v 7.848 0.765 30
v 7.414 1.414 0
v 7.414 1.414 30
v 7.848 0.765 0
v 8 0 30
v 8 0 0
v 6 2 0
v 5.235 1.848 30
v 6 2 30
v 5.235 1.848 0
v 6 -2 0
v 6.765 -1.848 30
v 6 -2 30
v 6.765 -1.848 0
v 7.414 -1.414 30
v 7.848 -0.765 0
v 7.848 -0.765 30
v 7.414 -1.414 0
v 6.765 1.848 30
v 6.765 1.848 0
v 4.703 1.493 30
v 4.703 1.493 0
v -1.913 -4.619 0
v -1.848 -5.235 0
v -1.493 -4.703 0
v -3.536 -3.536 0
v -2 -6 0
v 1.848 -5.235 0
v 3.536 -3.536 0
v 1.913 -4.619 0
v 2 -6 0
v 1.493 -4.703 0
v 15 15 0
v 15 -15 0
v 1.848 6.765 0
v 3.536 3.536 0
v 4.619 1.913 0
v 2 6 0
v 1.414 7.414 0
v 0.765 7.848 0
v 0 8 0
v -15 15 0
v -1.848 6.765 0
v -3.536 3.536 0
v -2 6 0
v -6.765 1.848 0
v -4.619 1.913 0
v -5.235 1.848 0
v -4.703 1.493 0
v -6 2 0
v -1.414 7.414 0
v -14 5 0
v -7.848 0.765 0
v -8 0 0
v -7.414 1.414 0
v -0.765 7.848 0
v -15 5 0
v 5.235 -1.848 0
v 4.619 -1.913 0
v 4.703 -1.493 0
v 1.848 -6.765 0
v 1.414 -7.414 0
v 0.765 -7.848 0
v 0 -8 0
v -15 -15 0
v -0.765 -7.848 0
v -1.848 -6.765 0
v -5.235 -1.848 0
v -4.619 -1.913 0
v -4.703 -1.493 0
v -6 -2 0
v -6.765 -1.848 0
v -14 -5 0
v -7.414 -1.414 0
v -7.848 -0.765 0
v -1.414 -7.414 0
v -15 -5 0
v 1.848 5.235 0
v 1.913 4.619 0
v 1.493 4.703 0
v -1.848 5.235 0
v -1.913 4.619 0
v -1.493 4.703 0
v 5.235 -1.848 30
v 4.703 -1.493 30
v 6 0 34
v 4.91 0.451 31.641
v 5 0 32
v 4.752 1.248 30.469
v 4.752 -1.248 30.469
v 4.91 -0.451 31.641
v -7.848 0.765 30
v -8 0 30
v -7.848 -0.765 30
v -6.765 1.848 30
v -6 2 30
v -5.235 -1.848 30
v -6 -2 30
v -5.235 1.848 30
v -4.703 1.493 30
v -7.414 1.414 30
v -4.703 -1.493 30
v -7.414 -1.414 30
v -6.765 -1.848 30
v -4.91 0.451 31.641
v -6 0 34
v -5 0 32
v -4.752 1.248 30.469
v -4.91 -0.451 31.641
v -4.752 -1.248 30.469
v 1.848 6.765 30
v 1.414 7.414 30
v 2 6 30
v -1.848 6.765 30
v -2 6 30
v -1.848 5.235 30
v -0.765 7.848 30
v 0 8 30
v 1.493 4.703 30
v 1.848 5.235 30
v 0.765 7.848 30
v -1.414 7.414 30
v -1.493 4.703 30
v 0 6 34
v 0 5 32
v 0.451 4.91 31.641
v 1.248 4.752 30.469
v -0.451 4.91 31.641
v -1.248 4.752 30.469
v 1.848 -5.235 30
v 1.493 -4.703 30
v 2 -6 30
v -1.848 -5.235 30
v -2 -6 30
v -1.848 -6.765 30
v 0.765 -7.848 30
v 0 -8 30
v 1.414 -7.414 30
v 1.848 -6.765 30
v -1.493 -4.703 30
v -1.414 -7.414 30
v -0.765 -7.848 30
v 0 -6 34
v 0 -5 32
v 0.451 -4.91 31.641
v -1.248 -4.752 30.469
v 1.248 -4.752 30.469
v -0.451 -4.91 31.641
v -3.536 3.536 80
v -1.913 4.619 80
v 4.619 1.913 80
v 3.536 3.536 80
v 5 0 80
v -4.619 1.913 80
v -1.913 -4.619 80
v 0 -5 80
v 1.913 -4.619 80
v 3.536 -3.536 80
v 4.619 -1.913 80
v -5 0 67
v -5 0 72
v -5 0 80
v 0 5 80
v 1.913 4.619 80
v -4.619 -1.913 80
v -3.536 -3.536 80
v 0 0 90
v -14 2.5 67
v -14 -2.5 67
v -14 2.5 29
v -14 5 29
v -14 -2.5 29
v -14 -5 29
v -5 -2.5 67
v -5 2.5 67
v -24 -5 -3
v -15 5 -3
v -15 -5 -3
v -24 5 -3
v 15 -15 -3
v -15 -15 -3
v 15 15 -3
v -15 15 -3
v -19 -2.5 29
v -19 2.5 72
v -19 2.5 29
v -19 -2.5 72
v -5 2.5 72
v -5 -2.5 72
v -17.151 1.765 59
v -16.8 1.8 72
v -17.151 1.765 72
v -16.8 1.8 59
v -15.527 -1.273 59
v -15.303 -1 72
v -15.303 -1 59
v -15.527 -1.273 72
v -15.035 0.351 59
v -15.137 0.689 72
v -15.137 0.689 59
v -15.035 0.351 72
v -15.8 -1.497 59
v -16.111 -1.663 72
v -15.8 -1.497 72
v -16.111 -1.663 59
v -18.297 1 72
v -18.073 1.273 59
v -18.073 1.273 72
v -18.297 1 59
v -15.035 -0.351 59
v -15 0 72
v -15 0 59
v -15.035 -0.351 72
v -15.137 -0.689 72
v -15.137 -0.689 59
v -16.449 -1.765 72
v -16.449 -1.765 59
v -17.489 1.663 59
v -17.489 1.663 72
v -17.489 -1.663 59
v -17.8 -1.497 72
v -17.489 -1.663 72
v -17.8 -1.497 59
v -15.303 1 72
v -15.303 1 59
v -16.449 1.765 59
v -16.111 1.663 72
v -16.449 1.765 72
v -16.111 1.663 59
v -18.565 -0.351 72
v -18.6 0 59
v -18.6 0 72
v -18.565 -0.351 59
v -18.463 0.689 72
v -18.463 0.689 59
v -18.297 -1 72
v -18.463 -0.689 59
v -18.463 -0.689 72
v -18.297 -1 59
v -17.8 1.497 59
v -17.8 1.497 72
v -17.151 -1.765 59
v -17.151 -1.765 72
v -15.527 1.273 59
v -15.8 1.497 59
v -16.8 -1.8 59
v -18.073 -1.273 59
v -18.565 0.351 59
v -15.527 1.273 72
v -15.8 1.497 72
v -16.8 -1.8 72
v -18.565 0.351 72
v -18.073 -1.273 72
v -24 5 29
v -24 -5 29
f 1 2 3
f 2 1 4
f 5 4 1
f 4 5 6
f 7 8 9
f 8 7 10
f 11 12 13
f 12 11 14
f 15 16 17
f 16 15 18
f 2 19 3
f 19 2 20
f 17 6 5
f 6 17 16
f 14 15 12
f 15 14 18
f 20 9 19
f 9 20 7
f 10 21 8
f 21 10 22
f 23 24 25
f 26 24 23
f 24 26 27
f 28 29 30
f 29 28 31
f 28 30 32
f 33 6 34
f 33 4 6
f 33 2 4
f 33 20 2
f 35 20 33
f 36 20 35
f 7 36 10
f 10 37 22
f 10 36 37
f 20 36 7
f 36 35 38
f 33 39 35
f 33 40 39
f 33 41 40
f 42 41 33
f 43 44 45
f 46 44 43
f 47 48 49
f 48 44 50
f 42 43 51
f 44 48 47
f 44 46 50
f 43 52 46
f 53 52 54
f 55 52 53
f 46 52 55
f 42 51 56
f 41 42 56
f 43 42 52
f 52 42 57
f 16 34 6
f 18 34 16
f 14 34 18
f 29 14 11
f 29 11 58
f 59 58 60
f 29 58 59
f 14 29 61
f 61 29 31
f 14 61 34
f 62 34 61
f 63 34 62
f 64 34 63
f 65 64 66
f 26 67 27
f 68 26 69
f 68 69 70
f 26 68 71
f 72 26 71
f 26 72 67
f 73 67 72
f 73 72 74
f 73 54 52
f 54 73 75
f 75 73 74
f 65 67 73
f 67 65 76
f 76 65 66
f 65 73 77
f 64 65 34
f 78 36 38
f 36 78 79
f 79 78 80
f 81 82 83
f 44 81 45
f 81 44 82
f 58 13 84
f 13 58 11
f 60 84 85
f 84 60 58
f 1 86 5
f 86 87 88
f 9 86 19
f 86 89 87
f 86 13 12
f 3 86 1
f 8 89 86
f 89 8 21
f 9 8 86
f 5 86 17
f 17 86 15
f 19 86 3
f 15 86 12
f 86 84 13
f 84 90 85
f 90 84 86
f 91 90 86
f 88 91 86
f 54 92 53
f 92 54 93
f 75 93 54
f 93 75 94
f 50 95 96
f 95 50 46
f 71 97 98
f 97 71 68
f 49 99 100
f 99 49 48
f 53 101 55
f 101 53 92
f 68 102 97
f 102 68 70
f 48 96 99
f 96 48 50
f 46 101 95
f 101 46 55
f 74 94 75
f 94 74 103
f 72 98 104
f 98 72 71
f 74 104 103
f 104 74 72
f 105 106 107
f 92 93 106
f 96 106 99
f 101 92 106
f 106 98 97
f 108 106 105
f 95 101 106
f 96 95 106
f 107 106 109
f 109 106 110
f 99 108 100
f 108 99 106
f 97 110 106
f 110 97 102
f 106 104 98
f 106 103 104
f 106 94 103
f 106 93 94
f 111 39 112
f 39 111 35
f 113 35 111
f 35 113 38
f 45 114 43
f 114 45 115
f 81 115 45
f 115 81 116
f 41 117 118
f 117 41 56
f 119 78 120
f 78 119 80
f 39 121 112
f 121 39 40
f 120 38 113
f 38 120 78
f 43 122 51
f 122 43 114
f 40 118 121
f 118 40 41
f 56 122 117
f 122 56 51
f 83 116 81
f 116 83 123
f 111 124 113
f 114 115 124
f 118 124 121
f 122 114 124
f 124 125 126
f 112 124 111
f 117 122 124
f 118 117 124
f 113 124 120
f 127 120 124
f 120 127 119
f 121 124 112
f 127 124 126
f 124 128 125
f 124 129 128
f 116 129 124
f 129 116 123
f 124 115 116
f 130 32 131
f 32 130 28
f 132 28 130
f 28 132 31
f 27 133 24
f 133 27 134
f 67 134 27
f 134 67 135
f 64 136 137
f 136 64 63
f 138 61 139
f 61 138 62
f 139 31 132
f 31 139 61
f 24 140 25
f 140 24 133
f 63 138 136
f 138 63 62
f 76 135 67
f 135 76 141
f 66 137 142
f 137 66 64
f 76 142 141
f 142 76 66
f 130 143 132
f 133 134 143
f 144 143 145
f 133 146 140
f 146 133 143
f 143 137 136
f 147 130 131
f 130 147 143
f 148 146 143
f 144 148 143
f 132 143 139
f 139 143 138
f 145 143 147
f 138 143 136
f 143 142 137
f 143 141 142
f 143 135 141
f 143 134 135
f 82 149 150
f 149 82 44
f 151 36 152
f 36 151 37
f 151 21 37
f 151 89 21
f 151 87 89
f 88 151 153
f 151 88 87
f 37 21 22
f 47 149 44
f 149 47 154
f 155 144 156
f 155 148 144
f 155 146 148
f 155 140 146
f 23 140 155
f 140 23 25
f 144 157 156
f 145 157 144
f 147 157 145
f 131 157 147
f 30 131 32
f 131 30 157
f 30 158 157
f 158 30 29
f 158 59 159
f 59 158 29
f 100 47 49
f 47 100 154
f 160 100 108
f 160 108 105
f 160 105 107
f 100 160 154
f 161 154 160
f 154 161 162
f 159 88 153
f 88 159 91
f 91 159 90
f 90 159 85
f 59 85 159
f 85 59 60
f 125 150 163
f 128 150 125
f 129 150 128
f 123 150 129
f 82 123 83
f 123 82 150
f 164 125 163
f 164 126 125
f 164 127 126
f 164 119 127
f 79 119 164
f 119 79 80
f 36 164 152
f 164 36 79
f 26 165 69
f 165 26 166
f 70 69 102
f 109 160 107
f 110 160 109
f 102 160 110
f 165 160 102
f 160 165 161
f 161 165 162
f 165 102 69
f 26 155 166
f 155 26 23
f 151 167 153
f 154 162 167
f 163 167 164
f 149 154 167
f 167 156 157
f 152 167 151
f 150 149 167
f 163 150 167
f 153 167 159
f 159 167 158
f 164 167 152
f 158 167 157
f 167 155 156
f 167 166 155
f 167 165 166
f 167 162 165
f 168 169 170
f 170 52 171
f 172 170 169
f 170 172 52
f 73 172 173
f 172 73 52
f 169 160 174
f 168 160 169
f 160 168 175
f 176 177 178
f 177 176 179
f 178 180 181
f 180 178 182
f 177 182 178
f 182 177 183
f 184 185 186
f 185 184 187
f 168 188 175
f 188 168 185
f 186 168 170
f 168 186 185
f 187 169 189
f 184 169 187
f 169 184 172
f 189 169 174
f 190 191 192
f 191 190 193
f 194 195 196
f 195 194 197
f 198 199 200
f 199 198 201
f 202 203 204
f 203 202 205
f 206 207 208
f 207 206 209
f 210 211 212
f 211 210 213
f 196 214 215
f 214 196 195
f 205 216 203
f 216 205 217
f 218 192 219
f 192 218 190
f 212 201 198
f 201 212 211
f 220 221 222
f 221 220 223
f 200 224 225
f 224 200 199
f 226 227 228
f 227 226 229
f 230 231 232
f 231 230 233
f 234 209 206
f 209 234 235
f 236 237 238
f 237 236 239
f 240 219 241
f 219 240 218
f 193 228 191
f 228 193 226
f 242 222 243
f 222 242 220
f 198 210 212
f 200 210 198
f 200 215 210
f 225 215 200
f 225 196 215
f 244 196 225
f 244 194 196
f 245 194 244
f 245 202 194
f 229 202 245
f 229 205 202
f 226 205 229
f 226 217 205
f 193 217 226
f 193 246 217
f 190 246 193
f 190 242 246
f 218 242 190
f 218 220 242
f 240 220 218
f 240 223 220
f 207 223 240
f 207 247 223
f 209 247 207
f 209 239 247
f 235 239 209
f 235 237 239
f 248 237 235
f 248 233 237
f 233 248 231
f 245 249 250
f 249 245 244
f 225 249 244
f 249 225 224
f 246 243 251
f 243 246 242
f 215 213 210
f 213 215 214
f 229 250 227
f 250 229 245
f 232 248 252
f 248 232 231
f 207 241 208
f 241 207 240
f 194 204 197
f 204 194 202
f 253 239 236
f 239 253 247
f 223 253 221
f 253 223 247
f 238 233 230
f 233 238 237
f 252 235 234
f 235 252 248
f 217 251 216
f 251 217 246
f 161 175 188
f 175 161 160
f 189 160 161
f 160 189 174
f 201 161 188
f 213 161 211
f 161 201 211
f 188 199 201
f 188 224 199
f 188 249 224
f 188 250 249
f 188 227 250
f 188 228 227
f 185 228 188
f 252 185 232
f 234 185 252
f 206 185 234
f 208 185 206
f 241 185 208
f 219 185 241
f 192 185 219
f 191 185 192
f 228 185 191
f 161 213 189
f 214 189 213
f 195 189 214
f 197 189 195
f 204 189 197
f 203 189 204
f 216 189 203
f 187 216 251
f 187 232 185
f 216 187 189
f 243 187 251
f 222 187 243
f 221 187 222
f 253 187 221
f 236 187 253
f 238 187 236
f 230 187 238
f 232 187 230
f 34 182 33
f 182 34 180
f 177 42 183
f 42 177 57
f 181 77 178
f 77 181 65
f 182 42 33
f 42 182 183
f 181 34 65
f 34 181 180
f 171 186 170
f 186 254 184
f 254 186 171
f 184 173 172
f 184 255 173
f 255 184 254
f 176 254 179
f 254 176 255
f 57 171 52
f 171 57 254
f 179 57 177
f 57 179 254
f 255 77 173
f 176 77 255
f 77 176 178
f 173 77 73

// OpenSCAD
height = 80;
sub_s = 0.4;


union(){ 
	cylinder(r=5,h=height);

	translate([0,0,height])
	cylinder(r1=5,r2=0,h=10);

	translate([6,0,0])
	scale(sub_s)
	{
		cylinder(r=5,h=height-5);

		translate([0,0,height-5])
		cylinder(r1=5,r2=0,h=10);
	}

	translate([-6,0,0])
	scale(sub_s)
	{
		cylinder(r=5,h=height-5);

		translate([0,0,height-5])
		cylinder(r1=5,r2=0,h=10);
	}

	translate([0,6,0])
	scale(sub_s)
	{
		cylinder(r=5,h=height-5);

		translate([0,0,height-5])
		cylinder(r1=5,r2=0,h=10);
	}

	translate([0,-6,0])
	scale(sub_s)
	{
		cylinder(r=5,h=height-5);

		translate([0,0,height-5])
		cylinder(r1=5,r2=0,h=10);
	}
}



translate( [ -30/2,-30/2,-3 ] )
cube( [30,30,3] );

translate( [ -10-30/2+1,-10+10/2,-3 ] )
cube( [10,10,height*sub_s] );

translate( [ -5-30/2+1,-5+5/2,-3 ] )
difference() {
	cube( [5,5,height-10] );
	translate( [ 2.2,2.5,height-18 ] )
	cylinder( r=1.8, h=10, $fn=32 );
}


translate( [ -19,-5+5/2,height-13 ] )
difference() {
	cube( [9+5,5,5] );

	translate( [ 2.2,2.5,-1 ] )
	cylinder( r=1.8, h=12, $fn=32 );
}
